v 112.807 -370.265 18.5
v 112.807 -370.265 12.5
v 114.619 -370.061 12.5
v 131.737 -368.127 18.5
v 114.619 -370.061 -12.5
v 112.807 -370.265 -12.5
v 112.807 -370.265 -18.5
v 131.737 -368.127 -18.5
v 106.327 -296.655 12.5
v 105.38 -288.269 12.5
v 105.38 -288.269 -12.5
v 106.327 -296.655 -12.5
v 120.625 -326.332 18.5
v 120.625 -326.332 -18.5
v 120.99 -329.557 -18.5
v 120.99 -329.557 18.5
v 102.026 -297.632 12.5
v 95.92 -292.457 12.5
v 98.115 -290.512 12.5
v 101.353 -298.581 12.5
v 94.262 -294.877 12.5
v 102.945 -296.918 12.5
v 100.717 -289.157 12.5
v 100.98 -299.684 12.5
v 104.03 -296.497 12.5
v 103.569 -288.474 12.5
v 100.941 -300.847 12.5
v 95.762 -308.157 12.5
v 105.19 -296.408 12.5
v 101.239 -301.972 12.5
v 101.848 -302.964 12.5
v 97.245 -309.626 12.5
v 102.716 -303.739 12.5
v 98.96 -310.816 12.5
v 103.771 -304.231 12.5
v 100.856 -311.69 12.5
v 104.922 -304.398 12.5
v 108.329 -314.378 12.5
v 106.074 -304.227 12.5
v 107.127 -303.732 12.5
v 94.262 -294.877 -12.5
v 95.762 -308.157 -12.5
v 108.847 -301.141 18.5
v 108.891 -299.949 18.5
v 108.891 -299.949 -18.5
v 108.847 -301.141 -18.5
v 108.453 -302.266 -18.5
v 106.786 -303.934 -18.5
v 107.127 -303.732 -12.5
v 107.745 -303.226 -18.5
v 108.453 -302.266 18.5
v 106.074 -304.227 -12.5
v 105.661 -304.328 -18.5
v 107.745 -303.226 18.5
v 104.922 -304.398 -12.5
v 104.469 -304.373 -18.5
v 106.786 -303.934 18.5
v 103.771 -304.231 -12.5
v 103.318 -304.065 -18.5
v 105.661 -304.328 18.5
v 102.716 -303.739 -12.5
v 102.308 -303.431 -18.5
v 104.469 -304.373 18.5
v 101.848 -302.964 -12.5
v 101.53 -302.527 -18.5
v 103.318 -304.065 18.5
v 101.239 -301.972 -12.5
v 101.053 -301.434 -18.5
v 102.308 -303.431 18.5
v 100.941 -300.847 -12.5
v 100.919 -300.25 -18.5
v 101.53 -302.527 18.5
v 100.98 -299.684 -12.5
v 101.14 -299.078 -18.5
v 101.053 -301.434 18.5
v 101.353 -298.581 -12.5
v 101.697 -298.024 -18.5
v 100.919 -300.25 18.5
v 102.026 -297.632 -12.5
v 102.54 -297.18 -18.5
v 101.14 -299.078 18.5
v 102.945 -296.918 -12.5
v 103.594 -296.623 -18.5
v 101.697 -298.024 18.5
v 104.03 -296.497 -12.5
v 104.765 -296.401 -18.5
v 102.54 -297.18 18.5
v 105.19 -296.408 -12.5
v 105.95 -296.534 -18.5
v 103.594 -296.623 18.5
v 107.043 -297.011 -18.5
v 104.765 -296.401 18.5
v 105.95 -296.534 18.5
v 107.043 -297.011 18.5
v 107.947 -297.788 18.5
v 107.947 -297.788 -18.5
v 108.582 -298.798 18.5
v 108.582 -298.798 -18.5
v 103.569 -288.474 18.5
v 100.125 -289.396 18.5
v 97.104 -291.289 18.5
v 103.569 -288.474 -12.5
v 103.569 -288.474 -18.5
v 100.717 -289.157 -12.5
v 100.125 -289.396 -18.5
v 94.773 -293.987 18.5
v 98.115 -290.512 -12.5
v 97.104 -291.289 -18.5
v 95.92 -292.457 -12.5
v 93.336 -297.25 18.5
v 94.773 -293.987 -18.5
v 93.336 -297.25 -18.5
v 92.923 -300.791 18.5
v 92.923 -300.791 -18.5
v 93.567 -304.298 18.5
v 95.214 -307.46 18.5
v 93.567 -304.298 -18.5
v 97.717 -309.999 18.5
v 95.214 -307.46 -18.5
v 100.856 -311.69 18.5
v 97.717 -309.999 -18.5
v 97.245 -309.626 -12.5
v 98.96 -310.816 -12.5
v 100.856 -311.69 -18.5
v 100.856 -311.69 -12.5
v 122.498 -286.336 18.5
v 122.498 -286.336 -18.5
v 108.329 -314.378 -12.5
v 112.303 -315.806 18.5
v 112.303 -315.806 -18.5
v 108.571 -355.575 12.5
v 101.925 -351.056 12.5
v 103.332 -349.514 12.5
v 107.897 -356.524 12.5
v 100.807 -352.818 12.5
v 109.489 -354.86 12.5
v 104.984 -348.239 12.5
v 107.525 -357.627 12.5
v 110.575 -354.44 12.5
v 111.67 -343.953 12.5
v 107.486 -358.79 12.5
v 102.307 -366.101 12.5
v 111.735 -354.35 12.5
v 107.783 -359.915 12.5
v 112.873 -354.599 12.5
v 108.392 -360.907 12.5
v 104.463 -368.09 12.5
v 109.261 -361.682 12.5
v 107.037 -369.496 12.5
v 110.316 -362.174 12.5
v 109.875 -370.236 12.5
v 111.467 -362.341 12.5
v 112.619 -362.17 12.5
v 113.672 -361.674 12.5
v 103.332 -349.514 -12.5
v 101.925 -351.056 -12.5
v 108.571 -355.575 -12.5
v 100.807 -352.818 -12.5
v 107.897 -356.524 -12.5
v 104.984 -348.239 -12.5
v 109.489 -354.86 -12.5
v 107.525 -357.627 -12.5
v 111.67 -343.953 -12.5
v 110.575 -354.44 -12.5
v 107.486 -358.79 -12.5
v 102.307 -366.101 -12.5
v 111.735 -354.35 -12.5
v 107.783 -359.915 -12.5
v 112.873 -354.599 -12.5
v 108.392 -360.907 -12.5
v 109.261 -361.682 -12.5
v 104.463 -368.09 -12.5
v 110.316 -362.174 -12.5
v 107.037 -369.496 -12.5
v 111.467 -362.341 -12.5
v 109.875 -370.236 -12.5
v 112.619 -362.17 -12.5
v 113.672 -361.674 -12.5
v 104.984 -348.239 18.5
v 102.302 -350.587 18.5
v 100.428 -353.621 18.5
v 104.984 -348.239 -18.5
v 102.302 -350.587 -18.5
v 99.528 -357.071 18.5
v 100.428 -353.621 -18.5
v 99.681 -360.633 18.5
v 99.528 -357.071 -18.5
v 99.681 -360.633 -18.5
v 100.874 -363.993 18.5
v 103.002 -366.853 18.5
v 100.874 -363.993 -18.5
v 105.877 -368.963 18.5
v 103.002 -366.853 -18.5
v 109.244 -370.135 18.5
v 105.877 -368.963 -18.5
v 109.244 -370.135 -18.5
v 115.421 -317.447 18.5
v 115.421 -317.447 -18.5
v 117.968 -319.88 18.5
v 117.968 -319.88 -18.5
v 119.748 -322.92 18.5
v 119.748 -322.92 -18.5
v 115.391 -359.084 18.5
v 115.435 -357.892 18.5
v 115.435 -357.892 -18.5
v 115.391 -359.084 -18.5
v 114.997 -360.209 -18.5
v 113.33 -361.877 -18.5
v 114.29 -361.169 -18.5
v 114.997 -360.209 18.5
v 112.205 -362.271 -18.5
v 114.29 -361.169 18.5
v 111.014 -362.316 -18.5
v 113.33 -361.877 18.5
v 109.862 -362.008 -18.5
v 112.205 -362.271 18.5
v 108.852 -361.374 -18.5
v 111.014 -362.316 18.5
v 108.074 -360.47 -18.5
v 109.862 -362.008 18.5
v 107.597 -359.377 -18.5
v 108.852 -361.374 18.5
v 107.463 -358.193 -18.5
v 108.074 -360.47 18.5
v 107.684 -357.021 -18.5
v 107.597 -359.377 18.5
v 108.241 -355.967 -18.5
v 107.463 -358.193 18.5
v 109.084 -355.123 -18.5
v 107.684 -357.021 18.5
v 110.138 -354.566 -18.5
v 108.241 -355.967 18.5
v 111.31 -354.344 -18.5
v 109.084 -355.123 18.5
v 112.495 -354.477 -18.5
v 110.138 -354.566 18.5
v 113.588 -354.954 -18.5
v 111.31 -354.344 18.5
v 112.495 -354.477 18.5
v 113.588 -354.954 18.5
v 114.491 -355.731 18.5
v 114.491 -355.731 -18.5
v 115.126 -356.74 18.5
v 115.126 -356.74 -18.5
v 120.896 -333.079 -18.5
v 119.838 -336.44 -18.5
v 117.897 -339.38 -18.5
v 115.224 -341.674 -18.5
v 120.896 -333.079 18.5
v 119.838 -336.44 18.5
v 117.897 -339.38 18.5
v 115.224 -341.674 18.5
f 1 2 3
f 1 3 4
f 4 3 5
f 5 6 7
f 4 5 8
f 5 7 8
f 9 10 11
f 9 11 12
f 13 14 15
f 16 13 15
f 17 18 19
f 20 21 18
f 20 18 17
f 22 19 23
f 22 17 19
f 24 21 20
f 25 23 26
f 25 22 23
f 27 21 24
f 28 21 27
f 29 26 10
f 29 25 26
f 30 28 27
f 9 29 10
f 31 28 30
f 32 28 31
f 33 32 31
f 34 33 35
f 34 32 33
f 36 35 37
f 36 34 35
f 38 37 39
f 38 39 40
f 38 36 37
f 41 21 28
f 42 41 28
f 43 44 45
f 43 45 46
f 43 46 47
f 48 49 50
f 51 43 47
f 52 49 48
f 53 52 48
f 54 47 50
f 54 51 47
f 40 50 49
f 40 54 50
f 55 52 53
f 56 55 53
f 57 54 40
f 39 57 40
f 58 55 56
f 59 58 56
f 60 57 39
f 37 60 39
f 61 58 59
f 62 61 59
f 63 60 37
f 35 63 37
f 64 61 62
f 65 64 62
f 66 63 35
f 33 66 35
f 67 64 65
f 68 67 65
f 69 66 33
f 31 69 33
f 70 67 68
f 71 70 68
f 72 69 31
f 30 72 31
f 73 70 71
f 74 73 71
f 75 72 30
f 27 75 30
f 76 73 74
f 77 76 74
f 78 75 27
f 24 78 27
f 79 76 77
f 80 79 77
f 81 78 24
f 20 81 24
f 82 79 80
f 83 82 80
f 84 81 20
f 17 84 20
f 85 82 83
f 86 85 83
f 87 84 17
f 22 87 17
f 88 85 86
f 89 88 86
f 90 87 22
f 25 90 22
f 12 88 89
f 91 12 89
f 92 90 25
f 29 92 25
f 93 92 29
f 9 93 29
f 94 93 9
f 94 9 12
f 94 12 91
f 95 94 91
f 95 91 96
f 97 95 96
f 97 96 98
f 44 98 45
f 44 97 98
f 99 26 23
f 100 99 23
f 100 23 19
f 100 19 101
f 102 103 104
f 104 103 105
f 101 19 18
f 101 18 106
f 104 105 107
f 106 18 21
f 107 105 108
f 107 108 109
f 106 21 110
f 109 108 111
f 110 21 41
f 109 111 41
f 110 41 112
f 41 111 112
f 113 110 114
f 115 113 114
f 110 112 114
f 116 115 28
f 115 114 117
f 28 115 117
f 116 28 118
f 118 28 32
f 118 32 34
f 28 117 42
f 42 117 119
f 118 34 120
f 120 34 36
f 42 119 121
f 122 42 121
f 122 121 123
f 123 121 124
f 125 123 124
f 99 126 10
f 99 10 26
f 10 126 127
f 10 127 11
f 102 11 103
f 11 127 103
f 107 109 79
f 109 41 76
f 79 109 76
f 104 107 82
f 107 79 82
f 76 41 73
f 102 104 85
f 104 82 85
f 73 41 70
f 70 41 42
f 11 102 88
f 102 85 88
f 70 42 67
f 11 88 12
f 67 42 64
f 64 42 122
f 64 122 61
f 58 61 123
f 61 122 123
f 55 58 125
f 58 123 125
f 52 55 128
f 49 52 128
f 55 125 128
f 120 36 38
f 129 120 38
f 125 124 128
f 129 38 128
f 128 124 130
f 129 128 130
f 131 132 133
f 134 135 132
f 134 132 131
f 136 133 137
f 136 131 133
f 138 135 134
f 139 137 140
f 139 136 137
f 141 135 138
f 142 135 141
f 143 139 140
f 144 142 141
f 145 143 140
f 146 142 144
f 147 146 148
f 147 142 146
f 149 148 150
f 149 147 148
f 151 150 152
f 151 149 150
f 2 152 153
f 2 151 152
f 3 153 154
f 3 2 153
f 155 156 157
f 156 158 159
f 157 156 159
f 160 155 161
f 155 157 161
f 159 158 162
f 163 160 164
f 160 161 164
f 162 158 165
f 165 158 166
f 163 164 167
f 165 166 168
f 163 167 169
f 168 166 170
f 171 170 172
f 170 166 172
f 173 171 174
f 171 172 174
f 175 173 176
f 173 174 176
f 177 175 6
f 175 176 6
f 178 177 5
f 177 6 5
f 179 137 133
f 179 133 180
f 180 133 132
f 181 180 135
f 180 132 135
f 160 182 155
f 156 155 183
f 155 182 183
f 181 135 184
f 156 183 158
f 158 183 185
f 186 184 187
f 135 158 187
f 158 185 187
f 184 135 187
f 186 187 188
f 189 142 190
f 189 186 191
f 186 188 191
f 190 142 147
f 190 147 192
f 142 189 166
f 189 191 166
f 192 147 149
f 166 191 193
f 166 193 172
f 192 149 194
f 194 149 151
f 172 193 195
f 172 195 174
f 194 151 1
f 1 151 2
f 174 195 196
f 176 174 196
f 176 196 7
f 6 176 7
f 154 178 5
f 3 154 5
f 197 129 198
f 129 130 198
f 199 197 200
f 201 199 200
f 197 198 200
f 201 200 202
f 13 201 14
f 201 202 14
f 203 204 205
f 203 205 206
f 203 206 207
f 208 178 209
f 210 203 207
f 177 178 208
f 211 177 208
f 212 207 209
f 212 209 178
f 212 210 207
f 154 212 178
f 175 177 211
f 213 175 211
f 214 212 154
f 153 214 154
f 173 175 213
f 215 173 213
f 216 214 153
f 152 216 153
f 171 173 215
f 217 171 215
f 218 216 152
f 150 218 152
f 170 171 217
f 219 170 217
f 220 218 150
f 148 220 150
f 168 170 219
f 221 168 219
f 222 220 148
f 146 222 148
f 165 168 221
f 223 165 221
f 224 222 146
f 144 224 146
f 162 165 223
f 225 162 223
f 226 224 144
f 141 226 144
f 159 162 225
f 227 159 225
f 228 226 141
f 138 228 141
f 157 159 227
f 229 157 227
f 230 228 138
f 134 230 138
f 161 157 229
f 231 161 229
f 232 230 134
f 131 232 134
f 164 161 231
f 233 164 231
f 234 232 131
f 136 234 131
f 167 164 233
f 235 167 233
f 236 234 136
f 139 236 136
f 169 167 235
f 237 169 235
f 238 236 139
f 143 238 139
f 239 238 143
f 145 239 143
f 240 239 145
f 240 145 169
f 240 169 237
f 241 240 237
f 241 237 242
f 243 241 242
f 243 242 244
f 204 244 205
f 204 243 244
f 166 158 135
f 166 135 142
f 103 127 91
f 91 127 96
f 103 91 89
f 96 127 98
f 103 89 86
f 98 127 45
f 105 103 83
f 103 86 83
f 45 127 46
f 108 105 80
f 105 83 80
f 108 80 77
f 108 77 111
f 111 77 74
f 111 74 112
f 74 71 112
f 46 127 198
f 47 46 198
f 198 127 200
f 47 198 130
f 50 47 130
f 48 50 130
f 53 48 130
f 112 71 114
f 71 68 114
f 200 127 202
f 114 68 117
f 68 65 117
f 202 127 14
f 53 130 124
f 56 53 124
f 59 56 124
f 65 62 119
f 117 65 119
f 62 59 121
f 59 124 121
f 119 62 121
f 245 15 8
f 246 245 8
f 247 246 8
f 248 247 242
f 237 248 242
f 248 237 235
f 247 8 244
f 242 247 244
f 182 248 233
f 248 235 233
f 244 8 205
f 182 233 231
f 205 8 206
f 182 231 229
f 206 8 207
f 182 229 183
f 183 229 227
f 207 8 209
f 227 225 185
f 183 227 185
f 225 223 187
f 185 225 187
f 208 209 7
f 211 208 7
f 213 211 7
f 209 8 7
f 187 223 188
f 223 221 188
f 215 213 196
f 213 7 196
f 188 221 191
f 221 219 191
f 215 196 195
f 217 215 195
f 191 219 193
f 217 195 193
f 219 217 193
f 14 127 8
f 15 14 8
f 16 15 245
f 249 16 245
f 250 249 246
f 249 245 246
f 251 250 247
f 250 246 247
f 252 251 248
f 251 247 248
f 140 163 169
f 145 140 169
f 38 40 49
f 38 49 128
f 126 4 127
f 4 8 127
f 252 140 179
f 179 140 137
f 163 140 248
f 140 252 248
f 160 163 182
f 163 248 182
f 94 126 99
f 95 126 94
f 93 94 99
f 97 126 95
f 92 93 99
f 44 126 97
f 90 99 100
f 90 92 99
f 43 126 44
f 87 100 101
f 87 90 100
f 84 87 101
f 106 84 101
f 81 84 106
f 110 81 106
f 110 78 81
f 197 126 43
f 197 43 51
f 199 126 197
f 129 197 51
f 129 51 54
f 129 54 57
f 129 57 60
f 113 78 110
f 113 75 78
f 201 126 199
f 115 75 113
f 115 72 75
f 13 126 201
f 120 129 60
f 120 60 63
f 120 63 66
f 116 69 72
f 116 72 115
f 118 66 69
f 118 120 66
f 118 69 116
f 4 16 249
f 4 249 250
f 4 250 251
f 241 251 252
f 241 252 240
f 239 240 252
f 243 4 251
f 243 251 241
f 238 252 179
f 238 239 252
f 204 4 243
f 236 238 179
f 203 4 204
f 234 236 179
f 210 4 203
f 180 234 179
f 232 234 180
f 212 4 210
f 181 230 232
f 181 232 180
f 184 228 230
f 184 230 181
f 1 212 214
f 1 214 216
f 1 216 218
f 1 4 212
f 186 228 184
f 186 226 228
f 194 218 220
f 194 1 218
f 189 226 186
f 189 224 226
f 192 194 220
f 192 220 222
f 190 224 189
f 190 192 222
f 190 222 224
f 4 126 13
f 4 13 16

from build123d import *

# Parameters (mm, degrees)
SKETCH2_R           = 4
BOSS_EXTRUDE1_DEPTH = 18.5
SKETCH3_W           = 11.7897503
SKETCH3_H           = 96.005071975
CUT_EXTRUDE1_DEPTH  = 12.5


with BuildPart() as part:
    # Sketch2 → Boss-Extrude1 (new body, symmetric)
    with BuildSketch(Plane(origin=(137.548518754, -674.152855032, 0), x_dir=(0.993680552, 0.112245088, 0), z_dir=(0, 0, -1))):
        with BuildLine():
            Line((9.525, -304.744352791), (28.575, -304.744352791))
            Line((28.575, -304.744352791), (28.575, -387.05564726))
            Line((28.575, -387.05564726), (9.525993953, -387.05564726))
            ThreePointArc((9.525993953, -387.05564726), (-2.161189853, -377.777730047), (4.223746974, -364.290603044))
            Line((4.223746974, -364.290603044), (15.13654472, -358.9155811))
            ThreePointArc((15.13654472, -358.9155811), (20.308242044, -354.231651246), (22.225, -347.522575972))
            Line((22.225, -347.522575972), (22.225, -344.276661697))
            ThreePointArc((22.225, -344.276661697), (20.30793231, -337.567088625), (15.135492786, -332.883138506))
            Line((15.135492786, -332.883138506), (4.223746974, -327.509886515))
            ThreePointArc((4.223746974, -327.509886515), (-2.162309457, -314.022809542), (9.525, -304.744352791))
        make_face()
        with Locations((9.525993953, -375.05564726)):
            Circle(SKETCH2_R, mode=Mode.SUBTRACT)
        with Locations((9.525, -316.744352791)):
            Circle(SKETCH2_R, mode=Mode.SUBTRACT)
    extrude(amount=BOSS_EXTRUDE1_DEPTH, both=True)

    # Sketch3 → Cut-Extrude1 (cut, symmetric)
    with BuildSketch(Plane(origin=(140.134572942, -673.053475883, 0), x_dir=(0.993680552, 0.112245088, 0), z_dir=(0, 0, -1))):
        with Locations((2.760437102, -344.382335899)):
            Rectangle(SKETCH3_W, SKETCH3_H)
    extrude(amount=CUT_EXTRUDE1_DEPTH, both=True, mode=Mode.SUBTRACT)


solid = part.part
